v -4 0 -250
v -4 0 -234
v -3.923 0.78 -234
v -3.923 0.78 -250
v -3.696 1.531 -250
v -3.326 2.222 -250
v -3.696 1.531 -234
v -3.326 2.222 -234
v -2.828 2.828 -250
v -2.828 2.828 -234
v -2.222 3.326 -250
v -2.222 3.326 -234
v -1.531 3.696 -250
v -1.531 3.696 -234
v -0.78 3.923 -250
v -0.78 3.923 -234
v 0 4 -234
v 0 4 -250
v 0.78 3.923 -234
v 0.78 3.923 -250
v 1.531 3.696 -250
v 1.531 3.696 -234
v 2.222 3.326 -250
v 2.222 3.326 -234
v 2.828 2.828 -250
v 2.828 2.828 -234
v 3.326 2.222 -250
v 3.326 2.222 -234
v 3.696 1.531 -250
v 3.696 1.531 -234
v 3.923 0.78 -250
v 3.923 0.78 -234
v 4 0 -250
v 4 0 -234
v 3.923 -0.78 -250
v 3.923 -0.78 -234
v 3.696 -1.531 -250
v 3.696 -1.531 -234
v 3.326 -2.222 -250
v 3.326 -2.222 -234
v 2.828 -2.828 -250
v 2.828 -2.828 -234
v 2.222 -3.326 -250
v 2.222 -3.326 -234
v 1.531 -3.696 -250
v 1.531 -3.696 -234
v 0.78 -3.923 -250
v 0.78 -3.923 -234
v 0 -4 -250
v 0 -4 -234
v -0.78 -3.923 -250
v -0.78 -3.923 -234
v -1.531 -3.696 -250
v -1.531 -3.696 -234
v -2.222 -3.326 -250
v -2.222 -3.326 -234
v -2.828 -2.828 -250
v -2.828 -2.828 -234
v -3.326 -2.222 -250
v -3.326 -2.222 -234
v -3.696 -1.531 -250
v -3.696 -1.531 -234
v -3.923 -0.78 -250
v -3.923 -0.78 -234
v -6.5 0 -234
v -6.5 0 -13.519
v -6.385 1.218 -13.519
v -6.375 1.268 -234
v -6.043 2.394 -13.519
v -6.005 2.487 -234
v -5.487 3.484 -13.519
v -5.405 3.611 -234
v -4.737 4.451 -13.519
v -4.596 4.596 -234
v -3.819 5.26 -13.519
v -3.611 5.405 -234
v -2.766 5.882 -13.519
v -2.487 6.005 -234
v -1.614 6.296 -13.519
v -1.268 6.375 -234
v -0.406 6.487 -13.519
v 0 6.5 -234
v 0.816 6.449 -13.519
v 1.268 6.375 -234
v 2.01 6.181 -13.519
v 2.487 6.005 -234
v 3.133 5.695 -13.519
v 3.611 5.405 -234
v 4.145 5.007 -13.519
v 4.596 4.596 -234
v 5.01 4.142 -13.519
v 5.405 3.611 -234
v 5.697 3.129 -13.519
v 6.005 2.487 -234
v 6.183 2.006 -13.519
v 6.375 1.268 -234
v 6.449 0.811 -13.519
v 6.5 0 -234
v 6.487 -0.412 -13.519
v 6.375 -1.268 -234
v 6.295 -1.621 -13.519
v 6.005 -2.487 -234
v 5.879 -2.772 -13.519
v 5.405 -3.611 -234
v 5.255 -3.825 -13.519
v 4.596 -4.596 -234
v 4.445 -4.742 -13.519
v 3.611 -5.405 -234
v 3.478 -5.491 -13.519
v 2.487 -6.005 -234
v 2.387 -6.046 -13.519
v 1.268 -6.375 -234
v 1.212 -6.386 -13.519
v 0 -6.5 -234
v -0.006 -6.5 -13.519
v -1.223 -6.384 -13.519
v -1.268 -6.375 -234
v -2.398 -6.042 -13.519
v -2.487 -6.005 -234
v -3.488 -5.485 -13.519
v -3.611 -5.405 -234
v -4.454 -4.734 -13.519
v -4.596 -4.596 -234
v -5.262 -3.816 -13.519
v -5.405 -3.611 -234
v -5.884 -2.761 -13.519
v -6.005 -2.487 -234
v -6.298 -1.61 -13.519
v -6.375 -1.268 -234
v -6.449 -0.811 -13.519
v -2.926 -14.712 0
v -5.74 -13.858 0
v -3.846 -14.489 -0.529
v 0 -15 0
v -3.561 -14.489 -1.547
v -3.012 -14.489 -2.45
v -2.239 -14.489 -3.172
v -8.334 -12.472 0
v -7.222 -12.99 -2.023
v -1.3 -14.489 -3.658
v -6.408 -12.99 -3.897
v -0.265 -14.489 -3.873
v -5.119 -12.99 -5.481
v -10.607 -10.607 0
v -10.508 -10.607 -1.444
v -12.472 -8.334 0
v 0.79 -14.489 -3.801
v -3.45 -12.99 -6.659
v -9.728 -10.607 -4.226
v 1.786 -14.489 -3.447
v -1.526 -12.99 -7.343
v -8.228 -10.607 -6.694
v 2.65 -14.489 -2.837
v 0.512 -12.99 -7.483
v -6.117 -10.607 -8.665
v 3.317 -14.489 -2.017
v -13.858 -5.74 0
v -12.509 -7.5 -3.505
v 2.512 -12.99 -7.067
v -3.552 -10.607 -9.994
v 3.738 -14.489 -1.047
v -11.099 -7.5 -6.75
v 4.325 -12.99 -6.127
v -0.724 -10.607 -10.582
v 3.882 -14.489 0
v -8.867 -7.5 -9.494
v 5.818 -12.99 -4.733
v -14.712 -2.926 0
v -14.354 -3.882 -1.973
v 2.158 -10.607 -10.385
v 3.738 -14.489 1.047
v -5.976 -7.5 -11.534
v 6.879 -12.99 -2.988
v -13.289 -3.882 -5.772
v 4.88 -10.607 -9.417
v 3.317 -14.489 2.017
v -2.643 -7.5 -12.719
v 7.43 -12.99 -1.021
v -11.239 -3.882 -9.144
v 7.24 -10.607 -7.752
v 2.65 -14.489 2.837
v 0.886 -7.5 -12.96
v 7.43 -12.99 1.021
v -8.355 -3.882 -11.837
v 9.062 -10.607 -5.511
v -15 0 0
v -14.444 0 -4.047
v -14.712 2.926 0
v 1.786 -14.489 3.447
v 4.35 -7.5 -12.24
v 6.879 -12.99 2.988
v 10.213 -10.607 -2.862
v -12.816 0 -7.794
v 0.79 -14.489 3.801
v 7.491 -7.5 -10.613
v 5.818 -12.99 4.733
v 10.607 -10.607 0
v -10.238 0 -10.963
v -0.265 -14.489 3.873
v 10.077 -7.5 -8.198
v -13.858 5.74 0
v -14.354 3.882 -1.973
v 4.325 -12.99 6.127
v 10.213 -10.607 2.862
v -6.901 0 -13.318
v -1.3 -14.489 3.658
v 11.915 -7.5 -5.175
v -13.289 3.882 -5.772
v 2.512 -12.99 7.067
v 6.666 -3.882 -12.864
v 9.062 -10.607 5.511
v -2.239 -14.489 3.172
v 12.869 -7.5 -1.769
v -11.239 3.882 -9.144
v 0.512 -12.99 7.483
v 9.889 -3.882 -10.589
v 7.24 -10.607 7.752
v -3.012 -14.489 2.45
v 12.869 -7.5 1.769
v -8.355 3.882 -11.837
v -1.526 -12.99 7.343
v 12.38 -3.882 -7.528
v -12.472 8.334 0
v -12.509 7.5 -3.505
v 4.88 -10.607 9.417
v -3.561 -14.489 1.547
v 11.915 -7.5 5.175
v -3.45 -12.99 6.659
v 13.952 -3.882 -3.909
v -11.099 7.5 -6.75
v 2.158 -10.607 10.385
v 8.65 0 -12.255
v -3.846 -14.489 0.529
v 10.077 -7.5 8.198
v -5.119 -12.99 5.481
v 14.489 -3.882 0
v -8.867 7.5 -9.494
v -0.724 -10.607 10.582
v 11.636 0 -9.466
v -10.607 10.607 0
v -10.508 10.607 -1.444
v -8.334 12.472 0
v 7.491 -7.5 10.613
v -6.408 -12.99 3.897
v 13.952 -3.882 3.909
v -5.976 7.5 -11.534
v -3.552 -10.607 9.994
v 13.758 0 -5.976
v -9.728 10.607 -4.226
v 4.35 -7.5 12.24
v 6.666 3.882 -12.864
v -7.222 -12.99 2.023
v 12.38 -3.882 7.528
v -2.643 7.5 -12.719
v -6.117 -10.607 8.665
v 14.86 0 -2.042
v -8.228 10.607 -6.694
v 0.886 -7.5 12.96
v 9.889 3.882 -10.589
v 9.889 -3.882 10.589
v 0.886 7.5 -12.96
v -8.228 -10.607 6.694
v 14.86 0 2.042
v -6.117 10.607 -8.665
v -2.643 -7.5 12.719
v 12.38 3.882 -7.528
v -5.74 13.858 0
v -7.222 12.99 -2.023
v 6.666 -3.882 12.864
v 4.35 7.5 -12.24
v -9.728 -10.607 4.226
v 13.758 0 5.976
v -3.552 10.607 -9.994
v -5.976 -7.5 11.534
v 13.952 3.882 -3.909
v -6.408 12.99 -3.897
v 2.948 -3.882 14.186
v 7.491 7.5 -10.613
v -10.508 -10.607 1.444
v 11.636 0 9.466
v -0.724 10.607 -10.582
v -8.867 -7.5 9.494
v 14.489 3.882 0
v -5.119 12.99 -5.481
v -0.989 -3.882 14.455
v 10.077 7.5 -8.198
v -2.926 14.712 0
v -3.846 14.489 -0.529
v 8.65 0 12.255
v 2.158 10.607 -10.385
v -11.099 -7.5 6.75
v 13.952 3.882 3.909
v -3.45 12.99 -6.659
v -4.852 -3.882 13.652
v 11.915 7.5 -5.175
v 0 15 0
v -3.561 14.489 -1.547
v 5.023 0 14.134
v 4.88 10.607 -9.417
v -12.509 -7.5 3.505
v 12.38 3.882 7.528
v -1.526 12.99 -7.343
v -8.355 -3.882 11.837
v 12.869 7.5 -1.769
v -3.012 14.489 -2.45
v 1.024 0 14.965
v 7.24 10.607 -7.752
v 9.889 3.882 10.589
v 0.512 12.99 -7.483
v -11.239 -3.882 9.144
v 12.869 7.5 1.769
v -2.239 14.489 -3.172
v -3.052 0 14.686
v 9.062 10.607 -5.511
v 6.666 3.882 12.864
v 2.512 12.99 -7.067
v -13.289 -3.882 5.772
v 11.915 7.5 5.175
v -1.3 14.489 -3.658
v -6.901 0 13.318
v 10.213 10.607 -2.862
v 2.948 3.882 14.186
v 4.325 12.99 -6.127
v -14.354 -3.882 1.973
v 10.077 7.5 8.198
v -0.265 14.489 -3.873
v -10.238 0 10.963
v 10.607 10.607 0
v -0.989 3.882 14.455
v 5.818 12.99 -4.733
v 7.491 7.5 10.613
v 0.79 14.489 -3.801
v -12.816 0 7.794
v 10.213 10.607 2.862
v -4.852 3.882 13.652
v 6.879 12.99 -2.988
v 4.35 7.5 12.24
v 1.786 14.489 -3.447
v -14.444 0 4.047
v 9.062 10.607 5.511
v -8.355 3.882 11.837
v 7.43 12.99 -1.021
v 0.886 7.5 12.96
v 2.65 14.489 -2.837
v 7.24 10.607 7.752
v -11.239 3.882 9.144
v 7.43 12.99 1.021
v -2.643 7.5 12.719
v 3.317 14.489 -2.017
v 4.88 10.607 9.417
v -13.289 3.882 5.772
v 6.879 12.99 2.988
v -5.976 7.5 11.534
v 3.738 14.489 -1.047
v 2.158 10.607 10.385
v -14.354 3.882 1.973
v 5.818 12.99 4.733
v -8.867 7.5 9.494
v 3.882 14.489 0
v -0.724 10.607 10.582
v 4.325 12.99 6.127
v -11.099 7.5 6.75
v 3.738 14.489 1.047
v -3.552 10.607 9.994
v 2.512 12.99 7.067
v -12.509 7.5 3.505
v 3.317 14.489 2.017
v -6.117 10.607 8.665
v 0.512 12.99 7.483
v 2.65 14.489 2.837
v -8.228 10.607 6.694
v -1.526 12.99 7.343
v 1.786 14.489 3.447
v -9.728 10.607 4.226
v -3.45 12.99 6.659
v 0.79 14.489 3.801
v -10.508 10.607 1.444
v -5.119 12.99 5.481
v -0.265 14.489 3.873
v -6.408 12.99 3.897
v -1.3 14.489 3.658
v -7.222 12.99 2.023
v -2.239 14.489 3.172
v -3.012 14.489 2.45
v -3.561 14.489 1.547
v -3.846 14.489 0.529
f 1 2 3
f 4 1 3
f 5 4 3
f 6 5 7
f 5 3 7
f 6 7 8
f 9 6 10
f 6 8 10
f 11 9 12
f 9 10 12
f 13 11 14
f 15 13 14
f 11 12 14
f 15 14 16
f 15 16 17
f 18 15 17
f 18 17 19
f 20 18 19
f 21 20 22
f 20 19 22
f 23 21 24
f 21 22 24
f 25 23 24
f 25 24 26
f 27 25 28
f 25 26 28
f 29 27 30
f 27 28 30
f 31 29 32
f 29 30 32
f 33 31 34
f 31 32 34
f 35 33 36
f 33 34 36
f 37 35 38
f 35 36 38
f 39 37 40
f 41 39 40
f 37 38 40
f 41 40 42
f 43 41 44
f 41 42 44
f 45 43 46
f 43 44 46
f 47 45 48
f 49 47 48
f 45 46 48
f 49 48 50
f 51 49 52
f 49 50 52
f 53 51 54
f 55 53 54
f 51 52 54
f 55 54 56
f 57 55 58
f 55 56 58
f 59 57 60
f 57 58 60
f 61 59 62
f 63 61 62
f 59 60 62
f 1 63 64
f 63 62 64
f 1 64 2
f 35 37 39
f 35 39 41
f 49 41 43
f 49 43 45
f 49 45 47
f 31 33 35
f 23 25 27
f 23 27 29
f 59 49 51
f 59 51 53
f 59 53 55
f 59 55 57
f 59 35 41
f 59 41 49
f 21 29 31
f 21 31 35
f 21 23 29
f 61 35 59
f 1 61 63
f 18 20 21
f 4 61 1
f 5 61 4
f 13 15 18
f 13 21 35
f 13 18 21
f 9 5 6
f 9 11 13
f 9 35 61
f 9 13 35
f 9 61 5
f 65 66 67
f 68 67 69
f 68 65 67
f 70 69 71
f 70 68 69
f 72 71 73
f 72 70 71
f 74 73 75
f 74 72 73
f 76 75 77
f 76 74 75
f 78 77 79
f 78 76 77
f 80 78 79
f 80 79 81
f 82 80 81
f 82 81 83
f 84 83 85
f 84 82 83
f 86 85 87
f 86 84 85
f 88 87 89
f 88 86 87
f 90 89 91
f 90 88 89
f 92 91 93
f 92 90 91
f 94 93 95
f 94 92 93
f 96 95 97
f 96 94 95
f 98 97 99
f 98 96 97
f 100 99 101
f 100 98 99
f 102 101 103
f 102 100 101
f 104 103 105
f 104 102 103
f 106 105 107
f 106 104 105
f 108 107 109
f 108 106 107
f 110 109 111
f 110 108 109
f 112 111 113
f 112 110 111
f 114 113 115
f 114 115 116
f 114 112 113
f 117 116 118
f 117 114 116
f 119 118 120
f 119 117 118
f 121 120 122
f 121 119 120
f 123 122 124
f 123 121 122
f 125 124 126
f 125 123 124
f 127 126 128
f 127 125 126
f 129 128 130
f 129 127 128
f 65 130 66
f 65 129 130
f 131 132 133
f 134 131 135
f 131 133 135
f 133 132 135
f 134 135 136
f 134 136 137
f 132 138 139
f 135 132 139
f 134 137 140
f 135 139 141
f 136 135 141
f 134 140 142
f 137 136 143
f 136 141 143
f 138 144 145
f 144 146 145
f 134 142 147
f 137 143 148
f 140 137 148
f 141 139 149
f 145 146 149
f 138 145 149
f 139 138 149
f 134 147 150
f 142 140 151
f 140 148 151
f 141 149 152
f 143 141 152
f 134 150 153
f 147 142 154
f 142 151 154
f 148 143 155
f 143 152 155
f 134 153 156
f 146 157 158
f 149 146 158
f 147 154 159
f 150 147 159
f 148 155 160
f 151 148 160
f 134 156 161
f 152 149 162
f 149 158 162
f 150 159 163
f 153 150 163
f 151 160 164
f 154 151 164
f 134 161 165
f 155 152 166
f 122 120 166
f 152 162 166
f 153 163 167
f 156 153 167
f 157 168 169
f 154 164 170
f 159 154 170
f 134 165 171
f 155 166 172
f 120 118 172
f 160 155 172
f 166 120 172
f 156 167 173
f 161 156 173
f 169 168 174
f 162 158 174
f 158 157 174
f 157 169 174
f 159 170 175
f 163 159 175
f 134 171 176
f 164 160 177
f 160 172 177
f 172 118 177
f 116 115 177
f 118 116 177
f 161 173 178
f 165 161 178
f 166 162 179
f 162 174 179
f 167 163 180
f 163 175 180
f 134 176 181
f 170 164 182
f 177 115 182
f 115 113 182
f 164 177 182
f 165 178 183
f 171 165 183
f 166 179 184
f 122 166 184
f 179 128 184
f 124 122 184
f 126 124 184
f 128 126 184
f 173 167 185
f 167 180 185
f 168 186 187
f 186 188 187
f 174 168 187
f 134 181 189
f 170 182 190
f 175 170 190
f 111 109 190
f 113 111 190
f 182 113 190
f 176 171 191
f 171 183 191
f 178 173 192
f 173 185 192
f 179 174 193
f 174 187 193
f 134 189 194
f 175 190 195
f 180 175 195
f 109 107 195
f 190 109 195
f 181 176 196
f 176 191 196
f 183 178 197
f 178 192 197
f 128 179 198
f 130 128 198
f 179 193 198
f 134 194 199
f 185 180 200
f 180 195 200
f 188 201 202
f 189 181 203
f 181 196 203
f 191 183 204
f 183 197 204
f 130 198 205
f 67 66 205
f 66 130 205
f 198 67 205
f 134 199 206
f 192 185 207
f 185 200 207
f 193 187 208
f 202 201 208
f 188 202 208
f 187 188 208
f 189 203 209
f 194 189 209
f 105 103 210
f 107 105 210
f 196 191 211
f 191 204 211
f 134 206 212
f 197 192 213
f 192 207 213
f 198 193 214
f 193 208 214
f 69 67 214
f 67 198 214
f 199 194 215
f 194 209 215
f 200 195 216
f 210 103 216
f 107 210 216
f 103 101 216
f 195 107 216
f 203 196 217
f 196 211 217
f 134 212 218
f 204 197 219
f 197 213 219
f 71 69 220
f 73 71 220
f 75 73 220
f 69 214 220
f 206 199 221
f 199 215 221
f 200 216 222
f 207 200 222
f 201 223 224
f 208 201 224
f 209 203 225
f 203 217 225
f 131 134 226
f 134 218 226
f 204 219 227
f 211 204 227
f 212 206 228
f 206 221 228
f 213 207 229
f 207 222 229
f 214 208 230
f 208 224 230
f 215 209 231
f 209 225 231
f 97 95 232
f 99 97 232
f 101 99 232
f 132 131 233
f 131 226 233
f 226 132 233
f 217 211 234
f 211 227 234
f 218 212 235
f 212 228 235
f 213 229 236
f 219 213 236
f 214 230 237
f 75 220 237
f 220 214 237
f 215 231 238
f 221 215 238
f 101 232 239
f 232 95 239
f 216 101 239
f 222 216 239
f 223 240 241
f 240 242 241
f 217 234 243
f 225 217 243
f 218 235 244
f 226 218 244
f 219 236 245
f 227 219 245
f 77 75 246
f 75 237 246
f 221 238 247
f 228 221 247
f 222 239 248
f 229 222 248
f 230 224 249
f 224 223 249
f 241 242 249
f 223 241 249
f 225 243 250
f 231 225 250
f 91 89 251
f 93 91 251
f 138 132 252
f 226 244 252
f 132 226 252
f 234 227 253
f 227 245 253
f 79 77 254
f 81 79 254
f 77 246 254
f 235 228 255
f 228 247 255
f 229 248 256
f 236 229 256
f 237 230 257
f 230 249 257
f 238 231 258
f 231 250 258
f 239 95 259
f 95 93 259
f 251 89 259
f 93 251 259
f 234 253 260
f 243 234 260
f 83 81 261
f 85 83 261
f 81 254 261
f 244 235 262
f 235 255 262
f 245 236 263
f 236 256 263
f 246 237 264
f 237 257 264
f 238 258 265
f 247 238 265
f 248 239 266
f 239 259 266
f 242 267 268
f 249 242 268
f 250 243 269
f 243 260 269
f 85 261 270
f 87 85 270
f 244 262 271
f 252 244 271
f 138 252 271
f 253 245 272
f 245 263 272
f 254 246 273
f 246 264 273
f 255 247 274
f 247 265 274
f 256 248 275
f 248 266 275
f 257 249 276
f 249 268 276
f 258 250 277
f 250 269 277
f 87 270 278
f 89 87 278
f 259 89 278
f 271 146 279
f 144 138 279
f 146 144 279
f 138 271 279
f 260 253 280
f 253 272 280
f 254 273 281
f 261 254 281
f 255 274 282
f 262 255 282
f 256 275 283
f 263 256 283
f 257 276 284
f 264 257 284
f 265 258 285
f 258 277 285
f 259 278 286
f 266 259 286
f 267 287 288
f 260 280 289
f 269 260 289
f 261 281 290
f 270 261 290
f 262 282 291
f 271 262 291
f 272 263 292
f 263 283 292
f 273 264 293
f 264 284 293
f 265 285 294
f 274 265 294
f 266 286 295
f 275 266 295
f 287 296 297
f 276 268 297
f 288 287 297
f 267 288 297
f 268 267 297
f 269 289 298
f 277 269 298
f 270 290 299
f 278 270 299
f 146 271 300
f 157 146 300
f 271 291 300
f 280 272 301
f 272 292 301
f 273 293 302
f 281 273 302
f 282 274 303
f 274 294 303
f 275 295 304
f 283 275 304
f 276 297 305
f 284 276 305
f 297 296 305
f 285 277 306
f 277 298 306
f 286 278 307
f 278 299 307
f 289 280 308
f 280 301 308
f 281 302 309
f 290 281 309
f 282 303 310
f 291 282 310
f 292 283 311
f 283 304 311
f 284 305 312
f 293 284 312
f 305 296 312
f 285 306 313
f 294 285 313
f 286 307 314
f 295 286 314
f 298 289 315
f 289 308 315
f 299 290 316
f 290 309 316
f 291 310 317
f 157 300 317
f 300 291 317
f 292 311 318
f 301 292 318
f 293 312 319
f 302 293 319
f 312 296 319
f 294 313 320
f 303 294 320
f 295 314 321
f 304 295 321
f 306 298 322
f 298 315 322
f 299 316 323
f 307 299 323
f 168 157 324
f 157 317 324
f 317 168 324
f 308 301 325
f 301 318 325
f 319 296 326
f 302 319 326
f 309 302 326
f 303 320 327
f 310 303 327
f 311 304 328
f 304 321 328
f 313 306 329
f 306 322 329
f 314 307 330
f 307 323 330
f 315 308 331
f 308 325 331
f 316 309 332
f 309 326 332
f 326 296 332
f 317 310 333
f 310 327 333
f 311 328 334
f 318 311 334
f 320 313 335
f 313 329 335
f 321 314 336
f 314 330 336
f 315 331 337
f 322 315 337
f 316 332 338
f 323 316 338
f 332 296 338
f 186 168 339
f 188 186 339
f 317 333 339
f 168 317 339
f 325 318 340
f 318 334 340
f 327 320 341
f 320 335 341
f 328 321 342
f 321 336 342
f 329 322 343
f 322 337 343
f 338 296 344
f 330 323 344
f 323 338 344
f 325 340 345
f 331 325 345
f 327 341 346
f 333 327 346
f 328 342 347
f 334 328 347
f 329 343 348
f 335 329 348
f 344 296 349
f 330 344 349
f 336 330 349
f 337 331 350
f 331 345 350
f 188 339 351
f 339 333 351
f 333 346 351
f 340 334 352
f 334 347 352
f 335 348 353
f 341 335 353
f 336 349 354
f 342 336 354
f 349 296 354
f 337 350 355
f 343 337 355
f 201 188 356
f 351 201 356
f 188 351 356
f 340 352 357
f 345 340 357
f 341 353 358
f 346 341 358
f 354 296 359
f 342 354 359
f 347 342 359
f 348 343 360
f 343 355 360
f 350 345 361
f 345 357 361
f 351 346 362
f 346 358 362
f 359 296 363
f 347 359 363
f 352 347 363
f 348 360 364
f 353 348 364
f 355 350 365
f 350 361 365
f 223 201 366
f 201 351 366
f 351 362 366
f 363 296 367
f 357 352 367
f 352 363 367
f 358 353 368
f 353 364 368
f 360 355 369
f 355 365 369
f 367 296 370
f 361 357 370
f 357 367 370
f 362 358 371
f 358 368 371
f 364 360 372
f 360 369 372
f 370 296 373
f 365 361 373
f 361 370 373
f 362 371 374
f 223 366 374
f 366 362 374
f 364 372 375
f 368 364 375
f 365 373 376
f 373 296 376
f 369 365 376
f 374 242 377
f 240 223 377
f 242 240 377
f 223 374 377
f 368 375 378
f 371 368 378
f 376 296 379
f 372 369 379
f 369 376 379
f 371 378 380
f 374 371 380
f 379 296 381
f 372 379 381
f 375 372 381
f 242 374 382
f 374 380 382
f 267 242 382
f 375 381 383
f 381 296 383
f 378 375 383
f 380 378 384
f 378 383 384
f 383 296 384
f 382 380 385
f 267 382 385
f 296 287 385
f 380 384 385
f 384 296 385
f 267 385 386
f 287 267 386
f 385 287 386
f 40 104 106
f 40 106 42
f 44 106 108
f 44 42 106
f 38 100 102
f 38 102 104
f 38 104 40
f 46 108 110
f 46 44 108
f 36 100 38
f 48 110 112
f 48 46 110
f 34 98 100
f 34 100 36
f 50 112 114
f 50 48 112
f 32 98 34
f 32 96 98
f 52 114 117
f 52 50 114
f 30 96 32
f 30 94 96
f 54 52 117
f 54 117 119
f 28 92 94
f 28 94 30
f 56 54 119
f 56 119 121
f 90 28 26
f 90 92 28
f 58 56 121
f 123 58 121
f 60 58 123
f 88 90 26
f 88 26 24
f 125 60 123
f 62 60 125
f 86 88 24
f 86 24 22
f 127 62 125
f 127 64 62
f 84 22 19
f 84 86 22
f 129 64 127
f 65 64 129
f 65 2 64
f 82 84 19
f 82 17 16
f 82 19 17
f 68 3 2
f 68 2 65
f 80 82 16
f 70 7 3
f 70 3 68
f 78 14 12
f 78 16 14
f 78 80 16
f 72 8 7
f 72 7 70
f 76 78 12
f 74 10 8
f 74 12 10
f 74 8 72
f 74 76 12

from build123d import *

# Parameters (mm, degrees)
SZKIC2_R                                = 6.5
DODANIE_WYCI_GNI_CIE1_DEPTH             = 219
DODANIE_WYCI_GNI_CIE1_DIRECTION_2_REACH = 38.742
SZKIC3_R                                = 4
DODANIE_WYCI_GNI_CIE2_DEPTH             = 16


with BuildPart() as part:
    # Szkic1 → Obrót5 (revolve)
    with BuildSketch(Plane.XY):
        with BuildLine():
            Line((0, 15), (0, -15))
            ThreePointArc((0, -15), (-15, 0), (0, 15))
        make_face()
    revolve(axis=Axis((0, 15, 0), (0, -1, 0)))

    # Szkic2 → Dodanie-wyciągnięcie1 (add)
    with BuildSketch(Plane(origin=(0, 0, -15), x_dir=(-1, 0, 0), z_dir=(0, 0, -1))):
        Circle(SZKIC2_R)
    extrude(amount=DODANIE_WYCI_GNI_CIE1_DEPTH)

    # Szkic2 → Dodanie-wyciągnięcie1 direction 2 (add, up to next)
    with BuildSketch(Plane(origin=(0, 0, -15), x_dir=(-1, 0, 0), z_dir=(0, 0, -1)), mode=Mode.PRIVATE) as dodanie_wyci_gni_cie1_direction_2_sk1:
        Circle(SZKIC2_R)
    dodanie_wyci_gni_cie1_direction_2_tool1 = extrude(dodanie_wyci_gni_cie1_direction_2_sk1.sketch, amount=-DODANIE_WYCI_GNI_CIE1_DIRECTION_2_REACH, mode=Mode.PRIVATE) - part.part
    add(dodanie_wyci_gni_cie1_direction_2_tool1.solids().sort_by_distance((0, 0, -15))[0])

    # Szkic3 → Dodanie-wyciągnięcie2 (add)
    with BuildSketch(Plane(origin=(0, 0, -234), x_dir=(-1, 0, 0), z_dir=(0, 0, -1))):
        Circle(SZKIC3_R)
    extrude(amount=DODANIE_WYCI_GNI_CIE2_DEPTH)


solid = part.part
